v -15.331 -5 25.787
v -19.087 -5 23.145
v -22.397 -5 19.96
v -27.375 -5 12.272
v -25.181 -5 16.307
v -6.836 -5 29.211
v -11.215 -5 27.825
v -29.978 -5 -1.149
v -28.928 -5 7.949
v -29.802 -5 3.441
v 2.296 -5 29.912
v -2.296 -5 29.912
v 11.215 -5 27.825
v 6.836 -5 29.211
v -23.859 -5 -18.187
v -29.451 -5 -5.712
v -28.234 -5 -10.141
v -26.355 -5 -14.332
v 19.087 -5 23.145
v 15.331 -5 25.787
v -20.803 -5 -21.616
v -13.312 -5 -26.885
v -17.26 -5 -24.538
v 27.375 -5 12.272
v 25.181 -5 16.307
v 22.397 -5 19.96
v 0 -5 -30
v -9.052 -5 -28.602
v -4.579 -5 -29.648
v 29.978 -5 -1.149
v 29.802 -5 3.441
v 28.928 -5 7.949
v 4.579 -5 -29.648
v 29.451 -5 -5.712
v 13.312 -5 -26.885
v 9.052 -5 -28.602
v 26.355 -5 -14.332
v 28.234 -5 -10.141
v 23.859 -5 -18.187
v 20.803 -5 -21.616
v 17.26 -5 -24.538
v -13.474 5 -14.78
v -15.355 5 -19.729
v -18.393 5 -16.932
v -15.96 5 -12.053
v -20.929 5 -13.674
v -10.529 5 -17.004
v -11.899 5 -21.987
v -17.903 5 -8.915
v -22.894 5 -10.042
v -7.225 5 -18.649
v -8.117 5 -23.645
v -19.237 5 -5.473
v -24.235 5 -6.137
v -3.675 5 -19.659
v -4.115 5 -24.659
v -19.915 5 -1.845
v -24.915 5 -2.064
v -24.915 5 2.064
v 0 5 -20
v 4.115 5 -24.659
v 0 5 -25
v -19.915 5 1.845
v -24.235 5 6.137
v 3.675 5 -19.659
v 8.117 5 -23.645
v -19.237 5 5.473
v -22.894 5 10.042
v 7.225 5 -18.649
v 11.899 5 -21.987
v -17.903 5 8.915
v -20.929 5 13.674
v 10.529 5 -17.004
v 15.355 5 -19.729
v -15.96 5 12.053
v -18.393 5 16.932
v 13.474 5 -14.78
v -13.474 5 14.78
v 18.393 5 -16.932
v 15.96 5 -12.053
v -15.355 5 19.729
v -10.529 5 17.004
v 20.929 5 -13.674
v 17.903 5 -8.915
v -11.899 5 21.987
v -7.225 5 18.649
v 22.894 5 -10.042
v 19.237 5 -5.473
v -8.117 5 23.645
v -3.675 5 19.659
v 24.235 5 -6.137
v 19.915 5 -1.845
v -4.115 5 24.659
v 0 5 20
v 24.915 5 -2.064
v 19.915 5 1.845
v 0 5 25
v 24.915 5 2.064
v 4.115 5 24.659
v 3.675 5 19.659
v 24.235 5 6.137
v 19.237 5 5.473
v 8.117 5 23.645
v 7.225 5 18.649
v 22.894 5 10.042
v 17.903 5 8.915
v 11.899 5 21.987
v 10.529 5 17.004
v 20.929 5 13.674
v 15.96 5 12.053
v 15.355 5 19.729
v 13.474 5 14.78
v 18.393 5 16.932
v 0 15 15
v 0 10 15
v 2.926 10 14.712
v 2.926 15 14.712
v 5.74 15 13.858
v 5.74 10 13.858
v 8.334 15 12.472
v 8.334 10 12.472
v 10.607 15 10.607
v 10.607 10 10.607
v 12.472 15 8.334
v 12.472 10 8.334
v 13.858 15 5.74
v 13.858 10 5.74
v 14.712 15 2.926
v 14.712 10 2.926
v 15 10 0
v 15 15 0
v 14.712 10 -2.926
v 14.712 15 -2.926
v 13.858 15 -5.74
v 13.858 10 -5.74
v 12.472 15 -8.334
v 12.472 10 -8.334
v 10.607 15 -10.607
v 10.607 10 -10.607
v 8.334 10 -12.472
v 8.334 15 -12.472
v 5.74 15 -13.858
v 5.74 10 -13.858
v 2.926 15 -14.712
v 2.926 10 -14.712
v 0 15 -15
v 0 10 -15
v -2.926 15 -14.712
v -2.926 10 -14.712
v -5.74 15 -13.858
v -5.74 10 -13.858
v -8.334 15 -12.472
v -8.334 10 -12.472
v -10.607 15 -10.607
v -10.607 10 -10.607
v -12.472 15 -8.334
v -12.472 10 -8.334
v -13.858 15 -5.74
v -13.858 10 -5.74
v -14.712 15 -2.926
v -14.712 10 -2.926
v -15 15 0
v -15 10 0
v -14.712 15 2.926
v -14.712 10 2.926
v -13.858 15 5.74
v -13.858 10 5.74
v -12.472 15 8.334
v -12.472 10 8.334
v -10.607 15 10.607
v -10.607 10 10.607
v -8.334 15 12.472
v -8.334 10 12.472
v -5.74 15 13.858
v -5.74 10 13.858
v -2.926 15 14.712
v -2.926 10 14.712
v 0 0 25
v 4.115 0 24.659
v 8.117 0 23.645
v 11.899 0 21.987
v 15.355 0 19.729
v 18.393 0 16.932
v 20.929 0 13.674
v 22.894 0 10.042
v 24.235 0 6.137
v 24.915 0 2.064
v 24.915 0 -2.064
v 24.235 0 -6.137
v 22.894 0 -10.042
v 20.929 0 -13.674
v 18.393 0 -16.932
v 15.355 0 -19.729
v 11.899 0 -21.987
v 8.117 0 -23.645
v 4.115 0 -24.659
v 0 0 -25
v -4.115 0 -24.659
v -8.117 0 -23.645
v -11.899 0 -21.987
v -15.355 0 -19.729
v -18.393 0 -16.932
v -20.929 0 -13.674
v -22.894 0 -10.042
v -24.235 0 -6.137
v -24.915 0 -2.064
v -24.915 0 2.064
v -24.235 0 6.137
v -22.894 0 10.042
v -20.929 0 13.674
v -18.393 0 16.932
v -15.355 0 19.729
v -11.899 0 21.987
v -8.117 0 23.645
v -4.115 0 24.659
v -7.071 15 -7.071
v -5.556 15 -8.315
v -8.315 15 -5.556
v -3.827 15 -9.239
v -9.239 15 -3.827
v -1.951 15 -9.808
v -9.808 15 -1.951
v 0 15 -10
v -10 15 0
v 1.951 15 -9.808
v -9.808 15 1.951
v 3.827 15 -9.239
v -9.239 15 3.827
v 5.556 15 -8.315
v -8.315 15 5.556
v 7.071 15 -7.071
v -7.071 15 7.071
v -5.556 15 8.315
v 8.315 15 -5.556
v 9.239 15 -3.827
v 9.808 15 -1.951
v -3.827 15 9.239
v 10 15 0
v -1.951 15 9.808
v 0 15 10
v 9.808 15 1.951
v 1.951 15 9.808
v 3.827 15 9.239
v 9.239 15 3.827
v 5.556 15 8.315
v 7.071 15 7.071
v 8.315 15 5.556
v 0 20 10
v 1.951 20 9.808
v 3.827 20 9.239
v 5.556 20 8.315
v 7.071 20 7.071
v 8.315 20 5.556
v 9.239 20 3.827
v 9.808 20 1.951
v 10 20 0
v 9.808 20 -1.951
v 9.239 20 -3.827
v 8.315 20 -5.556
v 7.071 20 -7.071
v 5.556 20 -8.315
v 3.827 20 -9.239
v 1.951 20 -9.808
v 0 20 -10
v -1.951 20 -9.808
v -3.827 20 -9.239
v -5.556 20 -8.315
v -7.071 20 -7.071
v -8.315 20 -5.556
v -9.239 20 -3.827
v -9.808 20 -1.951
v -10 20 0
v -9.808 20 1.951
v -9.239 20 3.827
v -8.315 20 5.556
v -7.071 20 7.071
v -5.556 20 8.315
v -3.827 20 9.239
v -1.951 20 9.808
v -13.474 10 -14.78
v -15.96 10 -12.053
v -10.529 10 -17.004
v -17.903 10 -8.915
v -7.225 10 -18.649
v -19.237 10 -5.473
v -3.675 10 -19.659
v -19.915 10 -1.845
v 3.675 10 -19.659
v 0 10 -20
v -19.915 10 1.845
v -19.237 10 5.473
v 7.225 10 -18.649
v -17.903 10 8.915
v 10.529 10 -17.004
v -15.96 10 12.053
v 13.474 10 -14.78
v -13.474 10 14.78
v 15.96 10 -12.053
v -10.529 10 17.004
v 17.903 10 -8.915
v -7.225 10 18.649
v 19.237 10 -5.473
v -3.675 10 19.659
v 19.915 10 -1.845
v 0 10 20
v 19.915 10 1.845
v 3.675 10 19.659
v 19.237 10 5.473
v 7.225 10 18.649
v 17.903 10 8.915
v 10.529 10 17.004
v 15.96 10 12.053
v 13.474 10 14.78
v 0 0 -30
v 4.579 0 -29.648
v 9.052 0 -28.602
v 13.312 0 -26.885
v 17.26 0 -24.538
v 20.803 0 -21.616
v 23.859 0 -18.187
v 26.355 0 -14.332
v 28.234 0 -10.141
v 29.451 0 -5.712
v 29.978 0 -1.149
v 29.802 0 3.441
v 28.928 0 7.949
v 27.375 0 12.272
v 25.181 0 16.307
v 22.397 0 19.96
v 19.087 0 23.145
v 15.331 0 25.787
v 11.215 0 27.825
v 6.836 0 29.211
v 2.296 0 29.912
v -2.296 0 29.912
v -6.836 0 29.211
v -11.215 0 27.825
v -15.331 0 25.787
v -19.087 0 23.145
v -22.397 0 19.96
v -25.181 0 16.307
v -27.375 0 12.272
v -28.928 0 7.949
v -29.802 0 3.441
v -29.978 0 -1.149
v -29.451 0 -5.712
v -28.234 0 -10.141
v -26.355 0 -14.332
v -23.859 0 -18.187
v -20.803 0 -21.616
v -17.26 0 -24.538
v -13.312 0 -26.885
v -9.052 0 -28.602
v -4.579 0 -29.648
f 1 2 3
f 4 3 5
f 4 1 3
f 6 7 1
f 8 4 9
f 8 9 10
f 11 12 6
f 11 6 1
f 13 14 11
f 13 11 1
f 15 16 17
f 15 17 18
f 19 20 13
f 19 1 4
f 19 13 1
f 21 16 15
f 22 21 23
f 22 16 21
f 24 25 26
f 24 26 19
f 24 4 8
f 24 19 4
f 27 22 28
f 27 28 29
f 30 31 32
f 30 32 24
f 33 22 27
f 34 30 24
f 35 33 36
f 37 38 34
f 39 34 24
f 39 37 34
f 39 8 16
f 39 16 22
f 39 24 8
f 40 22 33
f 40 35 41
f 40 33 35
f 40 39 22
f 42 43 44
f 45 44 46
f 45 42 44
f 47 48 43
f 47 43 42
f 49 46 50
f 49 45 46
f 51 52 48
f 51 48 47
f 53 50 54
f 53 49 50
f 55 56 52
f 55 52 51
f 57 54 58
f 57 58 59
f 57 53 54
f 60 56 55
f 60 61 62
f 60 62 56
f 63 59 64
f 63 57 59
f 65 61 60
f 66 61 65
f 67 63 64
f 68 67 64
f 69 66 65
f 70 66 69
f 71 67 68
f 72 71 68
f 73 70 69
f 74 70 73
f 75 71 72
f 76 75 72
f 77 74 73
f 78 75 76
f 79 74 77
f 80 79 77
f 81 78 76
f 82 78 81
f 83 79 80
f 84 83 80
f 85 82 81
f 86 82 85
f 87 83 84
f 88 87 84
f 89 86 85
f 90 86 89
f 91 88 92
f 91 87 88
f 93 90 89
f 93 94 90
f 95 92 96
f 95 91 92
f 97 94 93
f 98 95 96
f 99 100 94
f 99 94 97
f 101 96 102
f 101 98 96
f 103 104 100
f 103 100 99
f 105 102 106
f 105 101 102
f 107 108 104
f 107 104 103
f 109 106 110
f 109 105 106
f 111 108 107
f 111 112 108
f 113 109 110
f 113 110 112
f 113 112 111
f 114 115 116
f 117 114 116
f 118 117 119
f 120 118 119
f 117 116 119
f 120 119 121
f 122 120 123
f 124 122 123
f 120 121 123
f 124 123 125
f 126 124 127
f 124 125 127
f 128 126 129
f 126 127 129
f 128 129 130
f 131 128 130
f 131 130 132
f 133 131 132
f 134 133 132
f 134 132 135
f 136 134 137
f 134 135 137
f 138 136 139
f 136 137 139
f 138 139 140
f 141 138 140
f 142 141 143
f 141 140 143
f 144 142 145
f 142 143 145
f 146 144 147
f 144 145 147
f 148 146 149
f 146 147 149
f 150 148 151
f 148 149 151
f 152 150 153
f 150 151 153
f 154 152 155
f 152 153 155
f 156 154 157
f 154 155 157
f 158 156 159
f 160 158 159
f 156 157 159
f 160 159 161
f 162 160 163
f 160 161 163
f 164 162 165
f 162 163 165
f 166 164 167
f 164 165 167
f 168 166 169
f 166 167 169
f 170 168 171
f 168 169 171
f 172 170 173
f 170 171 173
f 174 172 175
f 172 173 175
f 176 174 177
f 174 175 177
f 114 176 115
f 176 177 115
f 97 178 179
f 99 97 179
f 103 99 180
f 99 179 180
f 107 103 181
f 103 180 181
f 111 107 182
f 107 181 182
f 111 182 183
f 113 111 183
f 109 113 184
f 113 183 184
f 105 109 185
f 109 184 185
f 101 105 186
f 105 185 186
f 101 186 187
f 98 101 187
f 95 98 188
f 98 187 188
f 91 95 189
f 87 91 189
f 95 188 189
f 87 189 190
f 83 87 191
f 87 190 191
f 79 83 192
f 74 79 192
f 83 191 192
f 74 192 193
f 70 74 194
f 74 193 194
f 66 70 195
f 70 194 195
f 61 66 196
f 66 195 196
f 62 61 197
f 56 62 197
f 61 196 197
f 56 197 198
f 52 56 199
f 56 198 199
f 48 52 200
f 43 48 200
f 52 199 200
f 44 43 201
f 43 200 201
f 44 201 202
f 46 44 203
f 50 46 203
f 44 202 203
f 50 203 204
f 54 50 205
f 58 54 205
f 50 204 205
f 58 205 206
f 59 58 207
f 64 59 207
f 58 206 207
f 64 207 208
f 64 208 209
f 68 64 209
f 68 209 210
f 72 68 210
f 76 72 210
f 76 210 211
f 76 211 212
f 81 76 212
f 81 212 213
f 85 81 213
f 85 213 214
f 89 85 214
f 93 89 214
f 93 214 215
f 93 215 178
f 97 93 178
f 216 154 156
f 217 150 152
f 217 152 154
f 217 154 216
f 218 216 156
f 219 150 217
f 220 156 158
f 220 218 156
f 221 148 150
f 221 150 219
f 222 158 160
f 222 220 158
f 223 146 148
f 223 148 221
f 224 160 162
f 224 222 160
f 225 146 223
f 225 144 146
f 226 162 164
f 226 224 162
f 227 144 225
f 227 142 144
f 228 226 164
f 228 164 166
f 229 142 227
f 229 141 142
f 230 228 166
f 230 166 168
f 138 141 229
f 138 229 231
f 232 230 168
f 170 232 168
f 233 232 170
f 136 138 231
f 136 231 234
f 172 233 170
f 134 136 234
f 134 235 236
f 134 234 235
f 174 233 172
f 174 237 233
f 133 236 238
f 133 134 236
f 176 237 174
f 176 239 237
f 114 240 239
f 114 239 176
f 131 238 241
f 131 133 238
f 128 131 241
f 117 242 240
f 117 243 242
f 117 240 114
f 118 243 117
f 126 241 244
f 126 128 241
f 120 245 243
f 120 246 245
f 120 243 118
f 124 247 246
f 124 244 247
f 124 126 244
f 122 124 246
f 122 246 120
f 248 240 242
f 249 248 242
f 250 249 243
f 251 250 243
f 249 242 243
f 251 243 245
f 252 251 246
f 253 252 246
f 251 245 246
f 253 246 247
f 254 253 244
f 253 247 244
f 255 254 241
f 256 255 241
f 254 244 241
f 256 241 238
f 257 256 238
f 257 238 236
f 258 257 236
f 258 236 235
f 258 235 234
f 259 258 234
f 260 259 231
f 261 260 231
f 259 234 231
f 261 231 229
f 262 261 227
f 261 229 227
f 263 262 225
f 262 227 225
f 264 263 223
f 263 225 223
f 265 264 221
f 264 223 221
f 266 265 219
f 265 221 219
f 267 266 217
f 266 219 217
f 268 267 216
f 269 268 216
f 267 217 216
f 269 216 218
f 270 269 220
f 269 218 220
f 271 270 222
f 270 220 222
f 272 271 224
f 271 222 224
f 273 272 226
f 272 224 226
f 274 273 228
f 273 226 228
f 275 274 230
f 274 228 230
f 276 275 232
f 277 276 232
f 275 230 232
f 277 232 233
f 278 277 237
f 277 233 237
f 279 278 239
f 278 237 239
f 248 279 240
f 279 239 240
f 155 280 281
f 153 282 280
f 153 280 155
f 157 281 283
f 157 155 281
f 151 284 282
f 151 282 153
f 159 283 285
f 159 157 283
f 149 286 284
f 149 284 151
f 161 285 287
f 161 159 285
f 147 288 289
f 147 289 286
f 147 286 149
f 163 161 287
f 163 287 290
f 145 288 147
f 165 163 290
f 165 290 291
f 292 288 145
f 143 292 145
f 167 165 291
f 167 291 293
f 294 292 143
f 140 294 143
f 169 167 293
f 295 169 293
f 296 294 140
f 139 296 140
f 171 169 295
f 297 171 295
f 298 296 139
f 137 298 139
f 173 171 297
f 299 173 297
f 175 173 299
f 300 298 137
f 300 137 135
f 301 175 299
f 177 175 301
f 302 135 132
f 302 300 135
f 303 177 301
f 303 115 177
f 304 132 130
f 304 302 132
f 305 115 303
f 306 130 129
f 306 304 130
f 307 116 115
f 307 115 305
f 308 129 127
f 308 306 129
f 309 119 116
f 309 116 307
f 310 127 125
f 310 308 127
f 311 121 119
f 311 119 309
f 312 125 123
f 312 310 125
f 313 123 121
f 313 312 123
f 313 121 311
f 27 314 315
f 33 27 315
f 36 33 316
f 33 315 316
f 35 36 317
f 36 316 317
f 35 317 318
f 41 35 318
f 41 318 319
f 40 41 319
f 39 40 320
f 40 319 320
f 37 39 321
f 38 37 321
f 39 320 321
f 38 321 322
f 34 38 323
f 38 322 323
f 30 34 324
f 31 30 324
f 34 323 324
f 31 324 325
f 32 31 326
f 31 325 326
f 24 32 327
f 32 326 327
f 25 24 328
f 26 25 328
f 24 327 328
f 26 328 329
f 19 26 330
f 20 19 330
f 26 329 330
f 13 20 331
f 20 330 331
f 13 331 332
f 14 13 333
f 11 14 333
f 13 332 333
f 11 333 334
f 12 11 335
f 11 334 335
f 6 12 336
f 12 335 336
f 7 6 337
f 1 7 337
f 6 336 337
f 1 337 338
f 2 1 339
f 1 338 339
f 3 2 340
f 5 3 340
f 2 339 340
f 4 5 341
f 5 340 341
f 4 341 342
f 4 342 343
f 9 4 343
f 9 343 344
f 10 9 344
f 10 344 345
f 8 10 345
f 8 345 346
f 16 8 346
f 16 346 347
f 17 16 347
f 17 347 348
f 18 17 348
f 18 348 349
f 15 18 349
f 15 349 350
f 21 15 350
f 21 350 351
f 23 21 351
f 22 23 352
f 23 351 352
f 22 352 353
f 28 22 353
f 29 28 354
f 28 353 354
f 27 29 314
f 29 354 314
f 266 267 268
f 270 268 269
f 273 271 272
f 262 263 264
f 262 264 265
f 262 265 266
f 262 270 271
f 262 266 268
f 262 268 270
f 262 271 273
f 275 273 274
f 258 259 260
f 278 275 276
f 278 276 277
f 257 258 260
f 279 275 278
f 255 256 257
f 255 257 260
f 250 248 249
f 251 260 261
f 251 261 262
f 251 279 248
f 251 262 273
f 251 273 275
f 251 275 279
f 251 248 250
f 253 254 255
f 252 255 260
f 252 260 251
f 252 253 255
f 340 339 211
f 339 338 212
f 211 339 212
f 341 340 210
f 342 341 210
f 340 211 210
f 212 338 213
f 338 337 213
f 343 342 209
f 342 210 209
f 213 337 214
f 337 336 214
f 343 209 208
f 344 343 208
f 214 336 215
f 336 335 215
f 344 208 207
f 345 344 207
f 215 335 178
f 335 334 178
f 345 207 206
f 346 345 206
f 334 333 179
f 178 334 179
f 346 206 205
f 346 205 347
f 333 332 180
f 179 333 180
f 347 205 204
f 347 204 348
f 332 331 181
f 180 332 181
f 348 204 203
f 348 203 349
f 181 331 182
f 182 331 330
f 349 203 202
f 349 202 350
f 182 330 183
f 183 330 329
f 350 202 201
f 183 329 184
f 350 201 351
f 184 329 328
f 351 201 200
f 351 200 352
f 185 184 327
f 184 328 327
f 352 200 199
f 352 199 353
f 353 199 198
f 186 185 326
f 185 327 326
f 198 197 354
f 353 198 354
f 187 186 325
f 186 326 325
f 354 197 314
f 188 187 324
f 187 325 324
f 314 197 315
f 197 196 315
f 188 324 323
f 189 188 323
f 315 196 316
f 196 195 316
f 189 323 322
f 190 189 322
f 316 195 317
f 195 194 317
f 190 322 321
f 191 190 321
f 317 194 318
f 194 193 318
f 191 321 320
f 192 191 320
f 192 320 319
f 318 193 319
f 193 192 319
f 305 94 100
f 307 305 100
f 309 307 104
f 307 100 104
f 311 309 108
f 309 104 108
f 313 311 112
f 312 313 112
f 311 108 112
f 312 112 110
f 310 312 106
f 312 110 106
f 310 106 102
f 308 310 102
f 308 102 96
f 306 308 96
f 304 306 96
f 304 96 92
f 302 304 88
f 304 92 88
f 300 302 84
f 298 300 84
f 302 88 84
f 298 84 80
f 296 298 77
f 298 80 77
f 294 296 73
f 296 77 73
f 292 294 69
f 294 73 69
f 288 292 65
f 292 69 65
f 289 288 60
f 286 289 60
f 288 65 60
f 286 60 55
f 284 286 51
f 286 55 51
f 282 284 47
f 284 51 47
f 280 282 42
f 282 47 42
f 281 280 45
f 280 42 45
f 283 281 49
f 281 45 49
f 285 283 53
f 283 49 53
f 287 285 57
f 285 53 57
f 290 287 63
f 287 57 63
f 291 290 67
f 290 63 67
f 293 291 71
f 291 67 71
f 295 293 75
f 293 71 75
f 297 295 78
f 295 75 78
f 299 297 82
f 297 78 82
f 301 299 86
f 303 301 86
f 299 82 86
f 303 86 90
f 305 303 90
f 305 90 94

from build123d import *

# Parameters (mm, degrees)
SCHIZZO1_R                   = 25
ESTRUSIONE_ESTRUSIONE1_DEPTH = 5
SCHIZZO2_R                   = 20
ESTRUSIONE_ESTRUSIONE2_DEPTH = 5
SCHIZZO3_R                   = 15
ESTRUSIONE_ESTRUSIONE3_DEPTH = 5
SCHIZZO4_R                   = 10
ESTRUSIONE_ESTRUSIONE4_DEPTH = 5
SCHIZZO6_R                   = 30
ESTRUSIONE_ESTRUSIONE6_DEPTH = 5


with BuildPart() as part:
    # Schizzo1 → Estrusione-Estrusione1 (new body)
    with BuildSketch(Plane(origin=(0, 0, 0), x_dir=(1, 0, 0), z_dir=(0, 1, 0))):
        with Locations(Location((0, 0, 0), (0, 0, 270))):
            Circle(SCHIZZO1_R)
    extrude(amount=ESTRUSIONE_ESTRUSIONE1_DEPTH)

    # Schizzo2 → Estrusione-Estrusione2 (add)
    with BuildSketch(Plane(origin=(0, 5, 0), x_dir=(1, 0, 0), z_dir=(0, 1, 0))):
        with Locations(Location((0, 0, 0), (0, 0, 270))):
            Circle(SCHIZZO2_R)
    extrude(amount=ESTRUSIONE_ESTRUSIONE2_DEPTH)

    # Schizzo3 → Estrusione-Estrusione3 (add)
    with BuildSketch(Plane(origin=(0, 10, 0), x_dir=(1, 0, 0), z_dir=(0, 1, 0))):
        with Locations(Location((0, 0, 0), (0, 0, 270))):
            Circle(SCHIZZO3_R)
    extrude(amount=ESTRUSIONE_ESTRUSIONE3_DEPTH)

    # Schizzo4 → Estrusione-Estrusione4 (add)
    with BuildSketch(Plane(origin=(0, 15, 0), x_dir=(1, 0, 0), z_dir=(0, 1, 0))):
        with Locations(Location((0, 0, 0), (0, 0, 270))):
            Circle(SCHIZZO4_R)
    extrude(amount=ESTRUSIONE_ESTRUSIONE4_DEPTH)

    # Schizzo6 → Estrusione-Estrusione6 (add)
    with BuildSketch(Plane.XZ):
        with Locations(Location((0, 0, 0), (0, 0, 270))):
            Circle(SCHIZZO6_R)
    extrude(amount=ESTRUSIONE_ESTRUSIONE6_DEPTH)


solid = part.part
